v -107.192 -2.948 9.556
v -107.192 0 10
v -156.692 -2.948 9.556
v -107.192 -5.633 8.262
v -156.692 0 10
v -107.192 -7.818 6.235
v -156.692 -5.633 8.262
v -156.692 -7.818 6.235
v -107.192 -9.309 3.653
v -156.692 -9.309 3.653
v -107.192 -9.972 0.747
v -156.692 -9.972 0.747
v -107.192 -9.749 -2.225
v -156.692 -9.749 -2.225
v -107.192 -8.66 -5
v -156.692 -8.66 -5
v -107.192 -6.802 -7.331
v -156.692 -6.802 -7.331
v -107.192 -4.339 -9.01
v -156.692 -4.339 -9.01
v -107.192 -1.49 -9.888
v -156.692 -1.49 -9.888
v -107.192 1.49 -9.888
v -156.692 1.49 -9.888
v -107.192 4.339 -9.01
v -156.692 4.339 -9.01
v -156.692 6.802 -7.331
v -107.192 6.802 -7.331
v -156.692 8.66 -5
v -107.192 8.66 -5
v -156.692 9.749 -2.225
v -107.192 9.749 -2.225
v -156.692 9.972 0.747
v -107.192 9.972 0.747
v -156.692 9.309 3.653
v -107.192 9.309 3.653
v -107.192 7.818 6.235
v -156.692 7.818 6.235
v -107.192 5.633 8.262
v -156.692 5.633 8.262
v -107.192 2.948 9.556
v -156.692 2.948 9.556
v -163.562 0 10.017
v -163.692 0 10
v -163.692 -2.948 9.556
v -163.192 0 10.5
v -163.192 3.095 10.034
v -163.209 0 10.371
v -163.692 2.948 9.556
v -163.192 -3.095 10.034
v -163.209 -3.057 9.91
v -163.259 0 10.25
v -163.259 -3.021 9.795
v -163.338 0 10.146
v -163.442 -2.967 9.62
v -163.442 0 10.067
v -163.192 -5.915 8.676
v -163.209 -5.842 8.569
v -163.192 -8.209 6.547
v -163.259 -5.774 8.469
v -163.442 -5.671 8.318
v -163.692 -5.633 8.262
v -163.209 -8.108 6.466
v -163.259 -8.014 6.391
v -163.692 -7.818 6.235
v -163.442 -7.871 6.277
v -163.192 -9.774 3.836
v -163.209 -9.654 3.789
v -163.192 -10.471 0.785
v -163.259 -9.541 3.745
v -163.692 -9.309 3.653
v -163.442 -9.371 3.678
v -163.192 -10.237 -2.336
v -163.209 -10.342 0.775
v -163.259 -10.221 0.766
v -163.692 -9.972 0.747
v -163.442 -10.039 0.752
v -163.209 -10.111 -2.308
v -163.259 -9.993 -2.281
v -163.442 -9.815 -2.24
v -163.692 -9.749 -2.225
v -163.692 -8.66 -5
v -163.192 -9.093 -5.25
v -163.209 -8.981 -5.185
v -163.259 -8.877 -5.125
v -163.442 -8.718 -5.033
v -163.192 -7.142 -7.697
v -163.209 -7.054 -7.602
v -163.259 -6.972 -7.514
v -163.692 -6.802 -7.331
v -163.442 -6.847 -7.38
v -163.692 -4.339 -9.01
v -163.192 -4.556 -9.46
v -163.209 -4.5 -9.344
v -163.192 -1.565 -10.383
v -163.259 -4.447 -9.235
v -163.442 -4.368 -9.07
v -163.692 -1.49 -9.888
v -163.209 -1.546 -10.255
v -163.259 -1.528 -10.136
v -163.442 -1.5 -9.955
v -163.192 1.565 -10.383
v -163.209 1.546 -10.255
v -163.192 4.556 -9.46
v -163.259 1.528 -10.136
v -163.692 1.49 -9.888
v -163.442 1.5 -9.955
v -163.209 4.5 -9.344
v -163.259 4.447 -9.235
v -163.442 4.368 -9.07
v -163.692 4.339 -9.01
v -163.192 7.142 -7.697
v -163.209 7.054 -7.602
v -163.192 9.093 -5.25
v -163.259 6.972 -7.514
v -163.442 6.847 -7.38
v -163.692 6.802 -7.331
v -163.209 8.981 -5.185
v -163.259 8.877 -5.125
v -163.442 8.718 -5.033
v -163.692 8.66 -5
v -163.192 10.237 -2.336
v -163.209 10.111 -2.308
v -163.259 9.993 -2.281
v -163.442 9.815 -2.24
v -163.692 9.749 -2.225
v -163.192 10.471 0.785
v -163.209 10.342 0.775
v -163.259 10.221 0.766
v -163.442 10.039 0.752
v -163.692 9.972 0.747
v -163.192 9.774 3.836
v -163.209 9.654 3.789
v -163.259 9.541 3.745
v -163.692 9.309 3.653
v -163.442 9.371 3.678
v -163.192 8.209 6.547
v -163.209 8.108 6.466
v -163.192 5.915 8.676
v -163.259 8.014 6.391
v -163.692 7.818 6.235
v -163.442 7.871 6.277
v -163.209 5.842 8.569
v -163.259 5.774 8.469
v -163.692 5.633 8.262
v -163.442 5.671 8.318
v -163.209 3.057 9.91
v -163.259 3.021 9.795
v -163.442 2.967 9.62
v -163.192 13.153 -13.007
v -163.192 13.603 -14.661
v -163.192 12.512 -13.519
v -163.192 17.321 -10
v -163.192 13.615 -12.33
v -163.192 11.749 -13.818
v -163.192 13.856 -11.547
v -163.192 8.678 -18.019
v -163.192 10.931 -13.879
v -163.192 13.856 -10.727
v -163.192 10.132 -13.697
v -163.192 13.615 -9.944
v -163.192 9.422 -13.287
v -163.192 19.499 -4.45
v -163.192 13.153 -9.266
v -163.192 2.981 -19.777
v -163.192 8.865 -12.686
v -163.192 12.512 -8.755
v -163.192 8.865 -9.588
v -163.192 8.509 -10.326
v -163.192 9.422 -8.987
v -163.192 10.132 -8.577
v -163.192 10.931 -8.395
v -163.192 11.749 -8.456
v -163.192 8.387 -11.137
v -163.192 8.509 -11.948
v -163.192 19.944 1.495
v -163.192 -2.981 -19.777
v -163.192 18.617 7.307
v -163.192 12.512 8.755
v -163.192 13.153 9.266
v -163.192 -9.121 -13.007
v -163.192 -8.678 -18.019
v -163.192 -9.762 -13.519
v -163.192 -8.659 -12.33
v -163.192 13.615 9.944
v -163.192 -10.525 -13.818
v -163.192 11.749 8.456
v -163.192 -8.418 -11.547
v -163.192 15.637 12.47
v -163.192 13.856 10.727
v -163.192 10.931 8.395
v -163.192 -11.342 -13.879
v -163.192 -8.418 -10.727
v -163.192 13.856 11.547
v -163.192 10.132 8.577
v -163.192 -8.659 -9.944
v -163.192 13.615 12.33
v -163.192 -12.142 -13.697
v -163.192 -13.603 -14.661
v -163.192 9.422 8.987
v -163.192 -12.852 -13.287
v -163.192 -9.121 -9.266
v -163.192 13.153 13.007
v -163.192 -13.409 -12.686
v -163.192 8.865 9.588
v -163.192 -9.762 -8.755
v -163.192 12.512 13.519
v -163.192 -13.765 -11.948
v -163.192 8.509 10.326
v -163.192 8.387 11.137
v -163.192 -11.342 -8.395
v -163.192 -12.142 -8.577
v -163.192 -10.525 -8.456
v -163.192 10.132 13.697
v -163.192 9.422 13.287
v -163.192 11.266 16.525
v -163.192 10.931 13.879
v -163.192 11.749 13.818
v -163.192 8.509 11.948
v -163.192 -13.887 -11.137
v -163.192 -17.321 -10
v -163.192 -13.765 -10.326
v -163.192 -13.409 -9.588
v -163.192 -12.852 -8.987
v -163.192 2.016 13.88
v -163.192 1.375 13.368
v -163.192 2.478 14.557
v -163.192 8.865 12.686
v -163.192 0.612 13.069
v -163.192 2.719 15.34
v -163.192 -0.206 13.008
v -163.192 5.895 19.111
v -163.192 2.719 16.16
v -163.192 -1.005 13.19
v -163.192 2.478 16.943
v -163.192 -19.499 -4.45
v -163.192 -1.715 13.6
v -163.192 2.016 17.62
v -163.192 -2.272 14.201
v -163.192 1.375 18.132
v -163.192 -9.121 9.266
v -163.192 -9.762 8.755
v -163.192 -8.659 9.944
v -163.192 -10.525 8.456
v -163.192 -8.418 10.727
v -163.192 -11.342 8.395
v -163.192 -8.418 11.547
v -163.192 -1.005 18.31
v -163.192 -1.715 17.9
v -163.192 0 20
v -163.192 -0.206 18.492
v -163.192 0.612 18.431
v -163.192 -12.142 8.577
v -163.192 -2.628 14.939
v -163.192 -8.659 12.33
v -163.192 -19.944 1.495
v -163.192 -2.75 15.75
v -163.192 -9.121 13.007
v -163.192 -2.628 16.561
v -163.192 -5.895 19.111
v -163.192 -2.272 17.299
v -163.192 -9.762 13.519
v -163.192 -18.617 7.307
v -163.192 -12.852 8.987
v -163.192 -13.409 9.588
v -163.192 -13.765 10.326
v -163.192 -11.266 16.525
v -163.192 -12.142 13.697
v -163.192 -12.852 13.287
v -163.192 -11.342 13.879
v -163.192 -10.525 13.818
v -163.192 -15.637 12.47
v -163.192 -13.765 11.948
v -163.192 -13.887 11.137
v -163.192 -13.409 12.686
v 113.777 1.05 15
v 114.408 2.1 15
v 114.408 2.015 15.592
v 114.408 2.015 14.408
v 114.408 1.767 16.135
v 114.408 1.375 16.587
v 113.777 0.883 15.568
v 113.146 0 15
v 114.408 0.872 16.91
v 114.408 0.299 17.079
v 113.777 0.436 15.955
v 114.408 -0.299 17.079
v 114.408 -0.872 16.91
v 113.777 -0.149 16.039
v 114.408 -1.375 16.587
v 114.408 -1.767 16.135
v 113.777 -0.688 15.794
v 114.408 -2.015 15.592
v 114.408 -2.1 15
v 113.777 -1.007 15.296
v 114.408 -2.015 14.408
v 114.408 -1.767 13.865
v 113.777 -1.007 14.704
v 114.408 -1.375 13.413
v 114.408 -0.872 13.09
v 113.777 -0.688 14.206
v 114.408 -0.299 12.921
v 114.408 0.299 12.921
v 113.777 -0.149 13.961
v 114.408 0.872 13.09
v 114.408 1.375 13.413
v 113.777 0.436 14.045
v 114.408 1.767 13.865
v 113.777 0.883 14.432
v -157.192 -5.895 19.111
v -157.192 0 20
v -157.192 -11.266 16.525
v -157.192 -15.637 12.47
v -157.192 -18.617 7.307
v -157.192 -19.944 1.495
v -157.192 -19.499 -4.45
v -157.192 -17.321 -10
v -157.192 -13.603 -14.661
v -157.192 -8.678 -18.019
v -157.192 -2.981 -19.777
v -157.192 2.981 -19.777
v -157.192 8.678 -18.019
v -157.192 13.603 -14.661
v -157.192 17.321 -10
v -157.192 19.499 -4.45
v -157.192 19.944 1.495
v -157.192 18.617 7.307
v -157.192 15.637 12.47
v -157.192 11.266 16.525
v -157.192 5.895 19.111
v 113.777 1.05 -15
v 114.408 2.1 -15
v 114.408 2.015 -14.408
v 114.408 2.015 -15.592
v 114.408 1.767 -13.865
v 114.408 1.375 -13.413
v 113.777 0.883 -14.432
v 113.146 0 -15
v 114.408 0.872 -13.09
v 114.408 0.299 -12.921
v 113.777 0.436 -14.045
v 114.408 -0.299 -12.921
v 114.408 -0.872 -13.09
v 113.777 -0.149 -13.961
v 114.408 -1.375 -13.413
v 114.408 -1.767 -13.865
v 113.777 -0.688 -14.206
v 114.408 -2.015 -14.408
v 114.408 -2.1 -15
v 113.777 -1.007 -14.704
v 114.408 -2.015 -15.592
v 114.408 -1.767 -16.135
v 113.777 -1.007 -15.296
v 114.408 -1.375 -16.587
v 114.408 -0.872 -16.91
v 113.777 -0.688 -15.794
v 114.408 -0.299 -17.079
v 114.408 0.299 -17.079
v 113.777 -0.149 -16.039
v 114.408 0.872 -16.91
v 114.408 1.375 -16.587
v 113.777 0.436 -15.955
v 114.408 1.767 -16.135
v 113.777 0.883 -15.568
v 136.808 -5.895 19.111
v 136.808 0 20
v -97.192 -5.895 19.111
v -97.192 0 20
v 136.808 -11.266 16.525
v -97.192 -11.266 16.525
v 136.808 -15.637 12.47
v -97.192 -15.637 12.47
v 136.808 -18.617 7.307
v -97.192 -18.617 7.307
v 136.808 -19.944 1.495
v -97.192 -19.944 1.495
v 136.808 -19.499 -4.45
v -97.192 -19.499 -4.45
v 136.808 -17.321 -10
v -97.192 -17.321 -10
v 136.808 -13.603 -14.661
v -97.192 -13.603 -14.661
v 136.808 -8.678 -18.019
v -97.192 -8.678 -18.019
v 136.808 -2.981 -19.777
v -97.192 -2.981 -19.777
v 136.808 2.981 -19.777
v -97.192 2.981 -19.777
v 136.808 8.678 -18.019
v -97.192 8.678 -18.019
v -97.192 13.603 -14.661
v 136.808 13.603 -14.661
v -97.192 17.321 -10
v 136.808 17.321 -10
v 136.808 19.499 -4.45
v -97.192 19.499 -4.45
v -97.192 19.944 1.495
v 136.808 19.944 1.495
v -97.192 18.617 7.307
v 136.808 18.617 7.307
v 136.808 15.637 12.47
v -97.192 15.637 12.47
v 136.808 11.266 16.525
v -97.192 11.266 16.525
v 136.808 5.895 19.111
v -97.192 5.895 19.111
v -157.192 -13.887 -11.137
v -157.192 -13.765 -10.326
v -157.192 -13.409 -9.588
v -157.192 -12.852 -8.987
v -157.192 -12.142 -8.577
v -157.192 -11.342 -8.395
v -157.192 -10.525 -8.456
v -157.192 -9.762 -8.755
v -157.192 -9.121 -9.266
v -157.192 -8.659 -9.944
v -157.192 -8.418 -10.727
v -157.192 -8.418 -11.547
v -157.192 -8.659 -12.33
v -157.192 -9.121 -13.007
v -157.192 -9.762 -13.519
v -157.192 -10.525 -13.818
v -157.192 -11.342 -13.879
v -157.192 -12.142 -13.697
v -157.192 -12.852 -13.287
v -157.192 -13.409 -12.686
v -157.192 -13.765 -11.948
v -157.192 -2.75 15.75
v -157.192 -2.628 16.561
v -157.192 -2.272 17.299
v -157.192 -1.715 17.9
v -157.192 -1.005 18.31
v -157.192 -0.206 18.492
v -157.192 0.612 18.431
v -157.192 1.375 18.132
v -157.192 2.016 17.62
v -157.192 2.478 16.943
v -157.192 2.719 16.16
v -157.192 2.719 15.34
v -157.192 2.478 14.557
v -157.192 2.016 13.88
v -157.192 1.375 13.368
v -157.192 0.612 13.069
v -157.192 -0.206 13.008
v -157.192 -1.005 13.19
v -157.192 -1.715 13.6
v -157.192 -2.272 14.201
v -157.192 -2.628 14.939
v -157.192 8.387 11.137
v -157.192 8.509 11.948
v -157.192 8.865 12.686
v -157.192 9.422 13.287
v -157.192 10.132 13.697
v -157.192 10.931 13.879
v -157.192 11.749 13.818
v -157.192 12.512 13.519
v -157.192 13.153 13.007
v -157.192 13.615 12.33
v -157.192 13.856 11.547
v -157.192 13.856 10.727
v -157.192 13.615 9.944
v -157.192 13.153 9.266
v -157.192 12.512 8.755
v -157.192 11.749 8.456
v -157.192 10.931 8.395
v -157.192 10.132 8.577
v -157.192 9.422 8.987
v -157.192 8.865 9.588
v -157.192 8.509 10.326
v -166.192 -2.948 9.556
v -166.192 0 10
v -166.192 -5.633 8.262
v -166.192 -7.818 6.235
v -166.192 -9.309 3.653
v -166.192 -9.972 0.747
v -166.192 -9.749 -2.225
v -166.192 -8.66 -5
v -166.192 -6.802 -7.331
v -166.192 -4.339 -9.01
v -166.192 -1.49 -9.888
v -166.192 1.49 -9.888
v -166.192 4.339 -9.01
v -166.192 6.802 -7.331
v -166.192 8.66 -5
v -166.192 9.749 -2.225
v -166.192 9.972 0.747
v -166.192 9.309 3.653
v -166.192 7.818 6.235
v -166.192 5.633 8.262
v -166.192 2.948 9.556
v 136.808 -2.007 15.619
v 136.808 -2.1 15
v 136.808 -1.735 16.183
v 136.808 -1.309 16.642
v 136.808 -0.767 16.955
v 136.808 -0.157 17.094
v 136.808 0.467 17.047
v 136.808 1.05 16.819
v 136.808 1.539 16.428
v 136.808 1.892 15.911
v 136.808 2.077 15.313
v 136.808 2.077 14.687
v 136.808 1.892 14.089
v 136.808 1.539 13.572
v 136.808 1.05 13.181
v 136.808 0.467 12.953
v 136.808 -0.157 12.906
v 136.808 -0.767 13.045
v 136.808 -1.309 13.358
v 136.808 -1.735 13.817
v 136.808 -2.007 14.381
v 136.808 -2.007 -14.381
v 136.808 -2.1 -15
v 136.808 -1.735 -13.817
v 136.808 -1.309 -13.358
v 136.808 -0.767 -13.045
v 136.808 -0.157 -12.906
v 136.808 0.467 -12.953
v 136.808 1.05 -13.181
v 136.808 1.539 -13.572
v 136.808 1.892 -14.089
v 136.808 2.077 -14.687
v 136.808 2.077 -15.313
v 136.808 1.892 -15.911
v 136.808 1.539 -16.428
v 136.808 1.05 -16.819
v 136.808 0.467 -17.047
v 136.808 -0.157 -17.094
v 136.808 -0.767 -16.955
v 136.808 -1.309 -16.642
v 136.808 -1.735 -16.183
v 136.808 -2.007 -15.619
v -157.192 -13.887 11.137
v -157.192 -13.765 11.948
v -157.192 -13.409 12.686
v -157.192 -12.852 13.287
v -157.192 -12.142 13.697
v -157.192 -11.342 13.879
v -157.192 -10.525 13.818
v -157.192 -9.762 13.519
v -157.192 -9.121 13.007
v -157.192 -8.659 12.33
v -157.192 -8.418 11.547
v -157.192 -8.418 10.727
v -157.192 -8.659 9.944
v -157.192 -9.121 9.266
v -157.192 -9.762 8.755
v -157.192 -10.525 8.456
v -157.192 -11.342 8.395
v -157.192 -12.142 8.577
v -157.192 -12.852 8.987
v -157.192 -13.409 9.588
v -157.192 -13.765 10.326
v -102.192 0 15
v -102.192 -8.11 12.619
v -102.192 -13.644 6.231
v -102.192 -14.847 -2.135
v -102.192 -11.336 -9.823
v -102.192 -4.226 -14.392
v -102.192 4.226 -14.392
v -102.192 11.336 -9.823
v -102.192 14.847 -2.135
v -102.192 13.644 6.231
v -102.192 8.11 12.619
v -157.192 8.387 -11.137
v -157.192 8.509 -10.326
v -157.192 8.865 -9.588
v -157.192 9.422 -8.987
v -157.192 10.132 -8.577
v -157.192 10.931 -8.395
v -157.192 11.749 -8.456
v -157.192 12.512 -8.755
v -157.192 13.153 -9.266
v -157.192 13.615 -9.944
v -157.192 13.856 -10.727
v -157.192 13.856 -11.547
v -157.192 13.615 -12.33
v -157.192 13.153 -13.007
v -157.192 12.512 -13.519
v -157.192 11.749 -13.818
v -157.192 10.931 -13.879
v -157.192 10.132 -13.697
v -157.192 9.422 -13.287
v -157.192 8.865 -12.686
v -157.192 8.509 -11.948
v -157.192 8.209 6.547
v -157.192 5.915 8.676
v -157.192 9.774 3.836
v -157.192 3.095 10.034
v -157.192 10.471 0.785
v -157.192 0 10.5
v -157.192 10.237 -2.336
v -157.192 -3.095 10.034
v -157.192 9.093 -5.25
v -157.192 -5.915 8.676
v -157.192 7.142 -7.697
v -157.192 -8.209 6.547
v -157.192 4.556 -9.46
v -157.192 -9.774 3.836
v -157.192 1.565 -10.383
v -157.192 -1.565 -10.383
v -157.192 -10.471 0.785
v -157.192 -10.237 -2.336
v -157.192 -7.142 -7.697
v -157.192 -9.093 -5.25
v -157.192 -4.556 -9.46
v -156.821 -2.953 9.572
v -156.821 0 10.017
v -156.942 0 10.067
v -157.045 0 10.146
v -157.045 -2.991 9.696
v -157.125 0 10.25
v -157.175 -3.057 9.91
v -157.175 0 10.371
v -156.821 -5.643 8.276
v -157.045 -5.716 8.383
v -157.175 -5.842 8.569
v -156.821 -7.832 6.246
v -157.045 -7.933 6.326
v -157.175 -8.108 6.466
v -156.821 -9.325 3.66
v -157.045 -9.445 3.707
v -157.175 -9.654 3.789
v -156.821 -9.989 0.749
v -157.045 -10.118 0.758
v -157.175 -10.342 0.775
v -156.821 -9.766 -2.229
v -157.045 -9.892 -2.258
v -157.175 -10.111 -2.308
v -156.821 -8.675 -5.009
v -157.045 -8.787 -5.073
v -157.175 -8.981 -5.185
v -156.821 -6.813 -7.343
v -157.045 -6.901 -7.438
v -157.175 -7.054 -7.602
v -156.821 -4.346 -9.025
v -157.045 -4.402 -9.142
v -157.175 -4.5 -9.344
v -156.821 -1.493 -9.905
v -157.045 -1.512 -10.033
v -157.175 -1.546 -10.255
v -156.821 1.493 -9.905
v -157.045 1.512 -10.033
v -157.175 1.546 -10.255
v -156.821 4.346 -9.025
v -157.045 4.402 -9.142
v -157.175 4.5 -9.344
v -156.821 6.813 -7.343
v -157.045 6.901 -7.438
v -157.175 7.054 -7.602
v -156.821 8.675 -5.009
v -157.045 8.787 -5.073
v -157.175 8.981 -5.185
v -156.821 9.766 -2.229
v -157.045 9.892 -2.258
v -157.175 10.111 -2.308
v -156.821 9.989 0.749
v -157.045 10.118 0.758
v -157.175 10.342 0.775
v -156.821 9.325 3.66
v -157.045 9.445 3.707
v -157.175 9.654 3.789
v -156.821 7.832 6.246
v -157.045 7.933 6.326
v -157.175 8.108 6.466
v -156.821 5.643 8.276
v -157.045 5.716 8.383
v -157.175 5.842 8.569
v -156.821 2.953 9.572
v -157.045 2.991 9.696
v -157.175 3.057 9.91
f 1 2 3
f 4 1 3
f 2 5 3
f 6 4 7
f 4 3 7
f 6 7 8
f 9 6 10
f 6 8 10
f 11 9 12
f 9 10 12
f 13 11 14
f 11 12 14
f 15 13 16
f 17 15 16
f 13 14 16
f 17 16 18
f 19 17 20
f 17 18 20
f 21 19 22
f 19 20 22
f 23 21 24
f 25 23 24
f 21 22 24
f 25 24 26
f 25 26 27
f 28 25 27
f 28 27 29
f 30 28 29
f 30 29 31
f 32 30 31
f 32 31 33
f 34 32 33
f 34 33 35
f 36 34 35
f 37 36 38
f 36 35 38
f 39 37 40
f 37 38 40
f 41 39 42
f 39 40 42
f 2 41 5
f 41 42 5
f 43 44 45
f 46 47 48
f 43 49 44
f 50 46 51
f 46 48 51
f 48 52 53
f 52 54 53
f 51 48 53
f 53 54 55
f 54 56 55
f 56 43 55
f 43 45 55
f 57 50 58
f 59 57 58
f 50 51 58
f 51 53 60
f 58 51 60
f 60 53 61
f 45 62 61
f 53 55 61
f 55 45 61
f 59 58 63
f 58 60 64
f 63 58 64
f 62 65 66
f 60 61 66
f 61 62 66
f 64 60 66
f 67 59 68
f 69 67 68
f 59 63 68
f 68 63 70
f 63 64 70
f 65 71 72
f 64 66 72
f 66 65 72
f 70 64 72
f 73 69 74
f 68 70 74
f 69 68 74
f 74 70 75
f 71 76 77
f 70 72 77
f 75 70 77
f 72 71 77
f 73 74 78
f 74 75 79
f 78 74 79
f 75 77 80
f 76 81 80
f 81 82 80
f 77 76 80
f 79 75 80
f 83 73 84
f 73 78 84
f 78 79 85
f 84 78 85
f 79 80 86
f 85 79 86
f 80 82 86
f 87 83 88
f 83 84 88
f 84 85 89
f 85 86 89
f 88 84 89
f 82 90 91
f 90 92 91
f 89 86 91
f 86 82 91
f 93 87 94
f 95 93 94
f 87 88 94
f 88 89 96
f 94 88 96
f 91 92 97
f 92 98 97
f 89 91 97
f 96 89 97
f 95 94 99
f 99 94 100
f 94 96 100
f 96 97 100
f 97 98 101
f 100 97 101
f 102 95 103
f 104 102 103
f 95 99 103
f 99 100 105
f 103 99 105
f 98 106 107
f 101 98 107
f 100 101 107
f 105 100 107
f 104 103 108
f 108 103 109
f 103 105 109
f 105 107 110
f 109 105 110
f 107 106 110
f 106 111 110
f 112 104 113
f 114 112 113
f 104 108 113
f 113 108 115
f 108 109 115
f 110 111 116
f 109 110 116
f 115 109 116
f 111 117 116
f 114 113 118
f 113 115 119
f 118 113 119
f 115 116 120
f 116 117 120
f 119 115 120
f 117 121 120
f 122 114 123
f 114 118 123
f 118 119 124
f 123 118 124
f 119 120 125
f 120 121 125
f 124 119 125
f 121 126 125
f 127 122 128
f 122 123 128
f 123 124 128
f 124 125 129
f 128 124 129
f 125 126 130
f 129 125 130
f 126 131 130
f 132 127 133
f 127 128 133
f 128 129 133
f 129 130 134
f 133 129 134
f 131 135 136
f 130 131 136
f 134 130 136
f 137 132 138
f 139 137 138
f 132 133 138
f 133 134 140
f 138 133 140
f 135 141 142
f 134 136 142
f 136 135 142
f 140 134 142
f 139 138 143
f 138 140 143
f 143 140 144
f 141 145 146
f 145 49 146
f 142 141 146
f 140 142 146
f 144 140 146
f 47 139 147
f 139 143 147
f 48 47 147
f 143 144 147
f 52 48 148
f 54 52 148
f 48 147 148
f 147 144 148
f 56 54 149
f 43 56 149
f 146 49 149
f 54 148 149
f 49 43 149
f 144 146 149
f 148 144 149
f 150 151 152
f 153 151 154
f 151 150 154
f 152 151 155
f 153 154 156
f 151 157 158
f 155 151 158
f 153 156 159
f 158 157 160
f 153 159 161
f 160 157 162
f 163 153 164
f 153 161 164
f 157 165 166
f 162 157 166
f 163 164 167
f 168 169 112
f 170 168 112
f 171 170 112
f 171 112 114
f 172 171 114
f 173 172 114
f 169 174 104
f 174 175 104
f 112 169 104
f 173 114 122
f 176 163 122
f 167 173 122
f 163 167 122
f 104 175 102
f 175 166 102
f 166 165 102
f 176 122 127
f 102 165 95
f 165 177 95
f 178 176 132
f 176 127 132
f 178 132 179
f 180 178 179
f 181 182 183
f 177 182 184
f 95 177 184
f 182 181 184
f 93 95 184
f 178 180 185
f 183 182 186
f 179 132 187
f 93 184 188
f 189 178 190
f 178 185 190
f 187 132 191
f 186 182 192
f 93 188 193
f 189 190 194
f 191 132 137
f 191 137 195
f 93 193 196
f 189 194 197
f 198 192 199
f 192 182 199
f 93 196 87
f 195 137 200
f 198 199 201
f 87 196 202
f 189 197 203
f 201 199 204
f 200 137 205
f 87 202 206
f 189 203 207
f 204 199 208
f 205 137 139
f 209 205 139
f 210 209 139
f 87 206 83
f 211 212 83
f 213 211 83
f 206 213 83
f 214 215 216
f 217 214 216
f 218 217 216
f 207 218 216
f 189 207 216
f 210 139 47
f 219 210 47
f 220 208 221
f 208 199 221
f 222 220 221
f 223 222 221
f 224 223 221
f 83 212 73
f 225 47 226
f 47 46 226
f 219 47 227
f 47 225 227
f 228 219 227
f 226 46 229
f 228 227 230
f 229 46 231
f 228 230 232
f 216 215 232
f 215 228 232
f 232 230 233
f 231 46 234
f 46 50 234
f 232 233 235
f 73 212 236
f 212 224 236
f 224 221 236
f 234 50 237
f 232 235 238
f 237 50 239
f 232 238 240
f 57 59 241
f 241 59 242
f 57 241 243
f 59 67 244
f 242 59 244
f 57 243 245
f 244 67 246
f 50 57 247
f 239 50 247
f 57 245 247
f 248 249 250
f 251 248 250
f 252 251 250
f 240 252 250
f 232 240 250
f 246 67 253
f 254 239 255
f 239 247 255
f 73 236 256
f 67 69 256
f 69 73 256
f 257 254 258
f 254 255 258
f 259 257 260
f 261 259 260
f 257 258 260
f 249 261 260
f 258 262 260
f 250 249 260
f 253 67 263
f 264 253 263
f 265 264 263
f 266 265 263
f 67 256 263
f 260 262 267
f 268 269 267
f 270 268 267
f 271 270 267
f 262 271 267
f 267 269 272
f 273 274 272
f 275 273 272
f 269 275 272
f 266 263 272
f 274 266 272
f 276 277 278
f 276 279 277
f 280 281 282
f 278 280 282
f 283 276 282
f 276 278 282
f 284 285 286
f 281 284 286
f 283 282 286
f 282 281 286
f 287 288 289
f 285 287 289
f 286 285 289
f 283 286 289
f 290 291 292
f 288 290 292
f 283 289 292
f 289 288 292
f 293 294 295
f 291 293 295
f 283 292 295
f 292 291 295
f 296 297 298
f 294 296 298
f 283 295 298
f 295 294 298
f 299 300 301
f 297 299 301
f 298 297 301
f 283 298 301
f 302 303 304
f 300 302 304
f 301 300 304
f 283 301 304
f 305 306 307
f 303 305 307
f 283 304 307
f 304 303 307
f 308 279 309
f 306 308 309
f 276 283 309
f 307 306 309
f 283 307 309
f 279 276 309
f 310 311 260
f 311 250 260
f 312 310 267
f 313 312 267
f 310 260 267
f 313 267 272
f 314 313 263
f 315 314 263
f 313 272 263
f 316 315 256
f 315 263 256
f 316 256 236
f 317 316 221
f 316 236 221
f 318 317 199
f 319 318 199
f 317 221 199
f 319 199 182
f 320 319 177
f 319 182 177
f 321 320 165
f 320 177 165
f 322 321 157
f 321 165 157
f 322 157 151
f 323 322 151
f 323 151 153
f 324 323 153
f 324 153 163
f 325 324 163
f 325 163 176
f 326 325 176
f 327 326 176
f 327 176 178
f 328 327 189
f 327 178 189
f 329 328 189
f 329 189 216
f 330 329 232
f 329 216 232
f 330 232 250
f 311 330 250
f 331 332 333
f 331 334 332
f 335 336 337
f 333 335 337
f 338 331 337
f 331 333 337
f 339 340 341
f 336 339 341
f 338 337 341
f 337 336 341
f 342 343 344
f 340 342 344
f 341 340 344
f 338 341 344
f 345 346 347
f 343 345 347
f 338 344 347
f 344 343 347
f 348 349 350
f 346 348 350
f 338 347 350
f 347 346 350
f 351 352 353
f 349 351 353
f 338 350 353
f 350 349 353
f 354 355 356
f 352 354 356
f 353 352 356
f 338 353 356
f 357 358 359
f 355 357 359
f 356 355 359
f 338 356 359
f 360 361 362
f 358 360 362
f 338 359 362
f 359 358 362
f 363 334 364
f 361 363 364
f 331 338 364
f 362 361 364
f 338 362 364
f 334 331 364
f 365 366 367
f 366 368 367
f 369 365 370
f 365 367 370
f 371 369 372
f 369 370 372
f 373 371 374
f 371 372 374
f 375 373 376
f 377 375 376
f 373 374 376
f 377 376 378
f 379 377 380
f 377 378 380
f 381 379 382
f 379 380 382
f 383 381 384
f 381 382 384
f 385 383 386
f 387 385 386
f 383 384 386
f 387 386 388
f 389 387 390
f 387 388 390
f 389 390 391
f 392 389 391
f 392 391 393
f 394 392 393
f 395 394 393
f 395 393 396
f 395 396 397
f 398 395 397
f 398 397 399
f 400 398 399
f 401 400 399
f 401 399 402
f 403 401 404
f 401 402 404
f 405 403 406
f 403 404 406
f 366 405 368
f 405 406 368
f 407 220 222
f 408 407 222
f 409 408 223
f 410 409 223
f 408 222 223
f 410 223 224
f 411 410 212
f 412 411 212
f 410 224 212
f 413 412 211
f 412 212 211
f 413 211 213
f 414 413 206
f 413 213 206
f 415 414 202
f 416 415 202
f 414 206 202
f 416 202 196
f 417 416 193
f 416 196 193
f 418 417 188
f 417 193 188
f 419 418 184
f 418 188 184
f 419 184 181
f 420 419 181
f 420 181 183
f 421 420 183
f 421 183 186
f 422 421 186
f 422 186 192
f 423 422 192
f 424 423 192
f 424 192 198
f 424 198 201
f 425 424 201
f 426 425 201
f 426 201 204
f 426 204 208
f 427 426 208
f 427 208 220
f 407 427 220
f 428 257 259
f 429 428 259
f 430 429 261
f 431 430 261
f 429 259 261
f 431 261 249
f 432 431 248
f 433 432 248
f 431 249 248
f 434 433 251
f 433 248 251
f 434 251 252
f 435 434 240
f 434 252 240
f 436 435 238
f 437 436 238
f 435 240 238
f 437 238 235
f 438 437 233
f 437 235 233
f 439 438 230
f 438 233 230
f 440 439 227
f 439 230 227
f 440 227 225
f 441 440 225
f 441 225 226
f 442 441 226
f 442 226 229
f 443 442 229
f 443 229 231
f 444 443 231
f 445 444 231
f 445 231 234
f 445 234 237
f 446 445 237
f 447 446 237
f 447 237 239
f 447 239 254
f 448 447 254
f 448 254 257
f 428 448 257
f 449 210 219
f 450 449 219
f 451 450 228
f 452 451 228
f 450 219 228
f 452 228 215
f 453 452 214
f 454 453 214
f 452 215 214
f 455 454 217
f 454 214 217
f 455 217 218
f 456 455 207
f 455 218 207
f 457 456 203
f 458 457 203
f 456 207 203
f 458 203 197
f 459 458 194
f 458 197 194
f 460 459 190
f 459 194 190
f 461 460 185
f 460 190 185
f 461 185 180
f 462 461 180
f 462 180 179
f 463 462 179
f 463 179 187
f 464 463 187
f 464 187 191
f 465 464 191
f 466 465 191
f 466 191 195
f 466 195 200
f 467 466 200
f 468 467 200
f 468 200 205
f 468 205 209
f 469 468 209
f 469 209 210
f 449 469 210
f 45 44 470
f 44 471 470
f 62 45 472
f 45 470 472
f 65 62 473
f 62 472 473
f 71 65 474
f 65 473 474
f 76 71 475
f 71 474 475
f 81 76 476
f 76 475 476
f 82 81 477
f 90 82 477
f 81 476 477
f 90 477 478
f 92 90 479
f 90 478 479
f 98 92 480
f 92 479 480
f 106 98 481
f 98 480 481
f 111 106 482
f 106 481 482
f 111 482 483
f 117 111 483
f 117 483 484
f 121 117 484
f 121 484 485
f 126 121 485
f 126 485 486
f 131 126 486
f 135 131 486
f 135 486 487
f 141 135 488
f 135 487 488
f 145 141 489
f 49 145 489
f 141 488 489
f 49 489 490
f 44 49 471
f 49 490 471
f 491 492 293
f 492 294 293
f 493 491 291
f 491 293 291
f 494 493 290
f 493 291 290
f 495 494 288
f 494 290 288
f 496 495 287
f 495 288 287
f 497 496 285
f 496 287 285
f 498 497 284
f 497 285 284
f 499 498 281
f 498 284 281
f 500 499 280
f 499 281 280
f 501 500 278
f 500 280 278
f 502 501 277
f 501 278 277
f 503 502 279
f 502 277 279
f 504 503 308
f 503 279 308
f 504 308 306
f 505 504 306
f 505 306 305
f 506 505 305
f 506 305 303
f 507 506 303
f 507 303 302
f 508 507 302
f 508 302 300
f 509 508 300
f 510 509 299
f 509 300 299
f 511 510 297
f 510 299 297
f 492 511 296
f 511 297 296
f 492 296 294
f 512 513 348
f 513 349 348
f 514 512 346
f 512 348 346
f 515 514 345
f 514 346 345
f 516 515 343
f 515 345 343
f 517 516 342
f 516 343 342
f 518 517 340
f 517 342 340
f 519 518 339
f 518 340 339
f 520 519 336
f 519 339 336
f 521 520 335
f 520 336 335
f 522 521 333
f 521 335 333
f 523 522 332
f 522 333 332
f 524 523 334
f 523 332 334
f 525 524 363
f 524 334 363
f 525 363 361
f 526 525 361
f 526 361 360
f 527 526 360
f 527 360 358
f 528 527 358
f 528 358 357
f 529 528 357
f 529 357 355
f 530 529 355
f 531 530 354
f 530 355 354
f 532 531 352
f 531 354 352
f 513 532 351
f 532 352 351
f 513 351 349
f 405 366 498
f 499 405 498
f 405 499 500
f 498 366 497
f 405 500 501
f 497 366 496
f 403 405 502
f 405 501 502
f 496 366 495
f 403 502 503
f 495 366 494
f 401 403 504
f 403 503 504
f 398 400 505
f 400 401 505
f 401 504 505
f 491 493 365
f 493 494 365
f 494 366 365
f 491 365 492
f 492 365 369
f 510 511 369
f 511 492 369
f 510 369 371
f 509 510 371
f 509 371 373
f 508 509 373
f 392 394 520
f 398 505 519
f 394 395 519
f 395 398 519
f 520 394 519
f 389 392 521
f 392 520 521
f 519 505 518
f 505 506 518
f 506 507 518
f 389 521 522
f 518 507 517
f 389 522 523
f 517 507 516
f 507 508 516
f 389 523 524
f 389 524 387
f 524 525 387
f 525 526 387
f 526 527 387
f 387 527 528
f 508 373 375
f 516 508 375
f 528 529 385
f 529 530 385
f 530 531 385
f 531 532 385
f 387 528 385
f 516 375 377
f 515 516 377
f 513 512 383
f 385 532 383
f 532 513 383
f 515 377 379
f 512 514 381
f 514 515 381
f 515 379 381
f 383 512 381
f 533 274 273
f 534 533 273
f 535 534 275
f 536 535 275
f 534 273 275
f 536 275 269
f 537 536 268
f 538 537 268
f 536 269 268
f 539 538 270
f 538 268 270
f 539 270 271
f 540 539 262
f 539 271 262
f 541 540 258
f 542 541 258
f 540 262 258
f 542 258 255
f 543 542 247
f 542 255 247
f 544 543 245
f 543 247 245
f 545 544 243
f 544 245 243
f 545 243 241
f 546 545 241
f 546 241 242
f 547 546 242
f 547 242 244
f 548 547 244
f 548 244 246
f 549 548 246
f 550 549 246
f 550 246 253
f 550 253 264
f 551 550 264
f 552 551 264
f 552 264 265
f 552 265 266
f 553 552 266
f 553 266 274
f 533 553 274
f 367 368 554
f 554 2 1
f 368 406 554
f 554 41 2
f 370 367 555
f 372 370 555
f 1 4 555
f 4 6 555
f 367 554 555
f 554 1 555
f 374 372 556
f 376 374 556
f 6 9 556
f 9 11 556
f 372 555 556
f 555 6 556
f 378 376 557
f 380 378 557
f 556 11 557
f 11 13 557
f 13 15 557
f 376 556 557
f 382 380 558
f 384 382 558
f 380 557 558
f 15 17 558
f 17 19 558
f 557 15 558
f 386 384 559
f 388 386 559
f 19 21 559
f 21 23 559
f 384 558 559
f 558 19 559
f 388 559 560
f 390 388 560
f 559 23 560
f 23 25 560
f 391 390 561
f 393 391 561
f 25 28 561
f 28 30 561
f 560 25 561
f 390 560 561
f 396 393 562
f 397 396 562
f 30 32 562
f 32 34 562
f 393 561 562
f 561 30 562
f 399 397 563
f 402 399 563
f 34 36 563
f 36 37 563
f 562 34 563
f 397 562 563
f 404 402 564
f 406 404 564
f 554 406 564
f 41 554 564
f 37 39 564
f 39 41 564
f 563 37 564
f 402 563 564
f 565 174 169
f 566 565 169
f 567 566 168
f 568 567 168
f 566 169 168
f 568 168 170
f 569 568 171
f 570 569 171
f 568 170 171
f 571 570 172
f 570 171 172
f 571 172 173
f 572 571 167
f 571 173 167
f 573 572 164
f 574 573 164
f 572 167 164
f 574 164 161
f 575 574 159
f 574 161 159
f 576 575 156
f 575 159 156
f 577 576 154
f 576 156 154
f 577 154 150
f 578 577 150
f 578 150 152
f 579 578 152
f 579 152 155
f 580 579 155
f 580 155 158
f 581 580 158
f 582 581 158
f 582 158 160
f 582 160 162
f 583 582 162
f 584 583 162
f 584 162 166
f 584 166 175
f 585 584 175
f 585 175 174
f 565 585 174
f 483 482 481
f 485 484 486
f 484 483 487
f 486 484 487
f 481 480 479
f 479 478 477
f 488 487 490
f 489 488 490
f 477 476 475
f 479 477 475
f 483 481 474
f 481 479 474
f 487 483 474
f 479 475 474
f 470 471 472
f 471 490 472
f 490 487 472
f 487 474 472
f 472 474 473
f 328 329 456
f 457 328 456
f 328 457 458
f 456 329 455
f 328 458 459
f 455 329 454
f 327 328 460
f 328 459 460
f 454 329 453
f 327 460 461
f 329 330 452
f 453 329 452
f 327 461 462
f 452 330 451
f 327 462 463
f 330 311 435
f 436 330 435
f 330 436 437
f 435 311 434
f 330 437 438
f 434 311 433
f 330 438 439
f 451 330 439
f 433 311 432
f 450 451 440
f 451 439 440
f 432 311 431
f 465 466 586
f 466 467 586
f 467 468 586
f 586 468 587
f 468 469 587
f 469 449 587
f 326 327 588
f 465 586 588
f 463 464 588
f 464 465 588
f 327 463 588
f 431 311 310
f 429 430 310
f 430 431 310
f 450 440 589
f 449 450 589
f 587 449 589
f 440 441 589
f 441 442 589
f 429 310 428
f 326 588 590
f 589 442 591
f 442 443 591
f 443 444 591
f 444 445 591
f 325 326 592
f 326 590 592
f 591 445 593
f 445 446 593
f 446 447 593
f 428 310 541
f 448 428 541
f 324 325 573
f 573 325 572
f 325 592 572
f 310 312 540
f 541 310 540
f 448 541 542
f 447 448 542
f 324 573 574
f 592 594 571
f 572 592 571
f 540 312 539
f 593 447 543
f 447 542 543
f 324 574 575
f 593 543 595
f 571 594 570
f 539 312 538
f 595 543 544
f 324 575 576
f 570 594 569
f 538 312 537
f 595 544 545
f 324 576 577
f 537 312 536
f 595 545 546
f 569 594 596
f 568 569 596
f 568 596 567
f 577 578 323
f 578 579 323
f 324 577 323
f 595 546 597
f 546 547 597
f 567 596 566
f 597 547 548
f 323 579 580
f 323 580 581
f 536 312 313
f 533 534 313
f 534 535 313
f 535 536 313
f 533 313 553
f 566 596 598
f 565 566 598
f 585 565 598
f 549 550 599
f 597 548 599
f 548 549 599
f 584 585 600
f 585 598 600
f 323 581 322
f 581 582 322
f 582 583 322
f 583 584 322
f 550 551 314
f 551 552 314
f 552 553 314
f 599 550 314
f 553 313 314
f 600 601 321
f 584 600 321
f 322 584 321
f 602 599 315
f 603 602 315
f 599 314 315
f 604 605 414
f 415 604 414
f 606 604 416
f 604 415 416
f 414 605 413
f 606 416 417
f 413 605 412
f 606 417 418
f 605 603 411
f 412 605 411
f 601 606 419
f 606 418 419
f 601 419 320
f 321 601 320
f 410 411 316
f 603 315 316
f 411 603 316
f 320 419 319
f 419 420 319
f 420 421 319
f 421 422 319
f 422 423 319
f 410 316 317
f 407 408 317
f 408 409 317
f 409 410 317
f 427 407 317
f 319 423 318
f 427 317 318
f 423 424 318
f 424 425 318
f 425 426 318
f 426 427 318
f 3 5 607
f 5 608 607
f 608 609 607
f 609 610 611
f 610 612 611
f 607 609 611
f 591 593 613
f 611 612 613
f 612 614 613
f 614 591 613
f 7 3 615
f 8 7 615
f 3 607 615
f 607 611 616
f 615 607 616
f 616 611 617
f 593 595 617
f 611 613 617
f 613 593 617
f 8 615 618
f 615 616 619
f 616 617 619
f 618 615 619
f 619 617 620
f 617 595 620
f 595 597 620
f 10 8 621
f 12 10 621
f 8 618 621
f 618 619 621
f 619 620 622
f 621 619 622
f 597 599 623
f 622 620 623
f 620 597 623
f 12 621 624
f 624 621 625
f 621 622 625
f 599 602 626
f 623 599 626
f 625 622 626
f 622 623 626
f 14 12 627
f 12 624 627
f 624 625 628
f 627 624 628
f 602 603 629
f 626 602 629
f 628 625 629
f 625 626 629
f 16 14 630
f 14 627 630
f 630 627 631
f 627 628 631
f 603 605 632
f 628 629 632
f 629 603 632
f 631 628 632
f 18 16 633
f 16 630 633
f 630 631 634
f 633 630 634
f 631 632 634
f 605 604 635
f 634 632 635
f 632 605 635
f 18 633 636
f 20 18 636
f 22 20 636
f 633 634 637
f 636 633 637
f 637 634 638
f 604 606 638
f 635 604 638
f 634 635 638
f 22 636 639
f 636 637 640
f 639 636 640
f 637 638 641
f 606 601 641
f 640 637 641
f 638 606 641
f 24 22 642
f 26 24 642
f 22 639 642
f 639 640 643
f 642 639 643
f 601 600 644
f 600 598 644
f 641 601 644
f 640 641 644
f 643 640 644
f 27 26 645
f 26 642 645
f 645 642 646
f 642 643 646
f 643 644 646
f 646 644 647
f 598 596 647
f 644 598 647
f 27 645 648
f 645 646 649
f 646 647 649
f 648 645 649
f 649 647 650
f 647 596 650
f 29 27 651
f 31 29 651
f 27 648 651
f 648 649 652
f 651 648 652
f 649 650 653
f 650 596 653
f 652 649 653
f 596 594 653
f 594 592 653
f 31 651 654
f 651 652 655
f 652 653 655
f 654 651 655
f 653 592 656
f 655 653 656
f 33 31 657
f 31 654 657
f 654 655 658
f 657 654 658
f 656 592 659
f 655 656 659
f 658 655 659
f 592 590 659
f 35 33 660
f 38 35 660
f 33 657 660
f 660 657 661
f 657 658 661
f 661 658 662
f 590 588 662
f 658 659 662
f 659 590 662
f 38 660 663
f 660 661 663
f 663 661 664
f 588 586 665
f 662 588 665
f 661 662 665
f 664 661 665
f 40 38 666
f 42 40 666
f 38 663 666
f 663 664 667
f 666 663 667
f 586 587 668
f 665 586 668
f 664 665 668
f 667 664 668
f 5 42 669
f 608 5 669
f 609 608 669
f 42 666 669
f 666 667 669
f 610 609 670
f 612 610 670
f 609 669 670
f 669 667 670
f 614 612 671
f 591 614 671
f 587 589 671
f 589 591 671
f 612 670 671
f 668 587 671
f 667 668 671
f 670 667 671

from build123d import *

# Parameters (mm, degrees)
F2_R     = 2.75
F3_DEPTH = 25
F5_D     = 4.2
F5_DEPTH = 22.4
F5_TIP   = 1.2618073


with BuildPart() as f1:
    # F0 (on Front) → F1 (revolve)
    with BuildSketch(Plane.XZ):
        with BuildLine():
            Line((-166.1916986587, 0), (-163.1916986587, 0))
            Line((-163.1916986587, 0), (136.8083013413, 0))
            Line((136.8083013413, 0), (136.8083013413, 20))
            Line((136.8083013413, 20), (-97.1916986587, 20))
            Line((-97.1916986587, 20), (-107.1916986587, 10))
            Line((-107.1916986587, 10), (-156.6916986587, 10))
            ThreePointArc((-156.6916986587, 10), (-157.0452520493, 10.1464466094), (-157.1916986587, 10.5))
            Line((-157.1916986587, 10.5), (-157.1916986587, 20))
            Line((-157.1916986587, 20), (-163.1916986587, 20))
            Line((-163.1916986587, 20), (-163.1916986587, 10.5))
            ThreePointArc((-163.1916986587, 10.5), (-163.3381452681, 10.1464466094), (-163.6916986587, 10))
            Line((-163.6916986587, 10), (-166.1916986587, 10))
            Line((-166.1916986587, 10), (-166.1916986587, 0))
        make_face()
    revolve(axis=Axis((-0.7568523288, 0, 0), (1, 0, 0)))

    # F2 (on face) → F3 (cut)
    with BuildSketch(Plane(origin=(-163.1916986587, 0, 0), x_dir=(0, -1, 0), z_dir=(-1, 0, 0))):
        with Locations((0, 15.75)):
            Circle(F2_R)
        with Locations((-11.1369318037, 11.1369318037)):
            Circle(F2_R)
        with Locations((-11.1369318037, -11.1369318037)):
            Circle(F2_R)
        with Locations((11.1369318037, -11.1369318037)):
            Circle(F2_R)
        with Locations((11.1369318037, 11.1369318037)):
            Circle(F2_R)
    extrude(amount=-F3_DEPTH, mode=Mode.SUBTRACT)

    # F5
    with Locations(Plane.YZ.offset(136.8083013413)):
        with Locations((0, 15), (0, -15)):
            Hole(F5_D / 2, depth=F5_DEPTH)
            with Locations((0, 0, -(F5_DEPTH + F5_TIP / 2))):  # 118° drill point
                Cone(0, F5_D / 2, F5_TIP, mode=Mode.SUBTRACT)


solid = f1.part
